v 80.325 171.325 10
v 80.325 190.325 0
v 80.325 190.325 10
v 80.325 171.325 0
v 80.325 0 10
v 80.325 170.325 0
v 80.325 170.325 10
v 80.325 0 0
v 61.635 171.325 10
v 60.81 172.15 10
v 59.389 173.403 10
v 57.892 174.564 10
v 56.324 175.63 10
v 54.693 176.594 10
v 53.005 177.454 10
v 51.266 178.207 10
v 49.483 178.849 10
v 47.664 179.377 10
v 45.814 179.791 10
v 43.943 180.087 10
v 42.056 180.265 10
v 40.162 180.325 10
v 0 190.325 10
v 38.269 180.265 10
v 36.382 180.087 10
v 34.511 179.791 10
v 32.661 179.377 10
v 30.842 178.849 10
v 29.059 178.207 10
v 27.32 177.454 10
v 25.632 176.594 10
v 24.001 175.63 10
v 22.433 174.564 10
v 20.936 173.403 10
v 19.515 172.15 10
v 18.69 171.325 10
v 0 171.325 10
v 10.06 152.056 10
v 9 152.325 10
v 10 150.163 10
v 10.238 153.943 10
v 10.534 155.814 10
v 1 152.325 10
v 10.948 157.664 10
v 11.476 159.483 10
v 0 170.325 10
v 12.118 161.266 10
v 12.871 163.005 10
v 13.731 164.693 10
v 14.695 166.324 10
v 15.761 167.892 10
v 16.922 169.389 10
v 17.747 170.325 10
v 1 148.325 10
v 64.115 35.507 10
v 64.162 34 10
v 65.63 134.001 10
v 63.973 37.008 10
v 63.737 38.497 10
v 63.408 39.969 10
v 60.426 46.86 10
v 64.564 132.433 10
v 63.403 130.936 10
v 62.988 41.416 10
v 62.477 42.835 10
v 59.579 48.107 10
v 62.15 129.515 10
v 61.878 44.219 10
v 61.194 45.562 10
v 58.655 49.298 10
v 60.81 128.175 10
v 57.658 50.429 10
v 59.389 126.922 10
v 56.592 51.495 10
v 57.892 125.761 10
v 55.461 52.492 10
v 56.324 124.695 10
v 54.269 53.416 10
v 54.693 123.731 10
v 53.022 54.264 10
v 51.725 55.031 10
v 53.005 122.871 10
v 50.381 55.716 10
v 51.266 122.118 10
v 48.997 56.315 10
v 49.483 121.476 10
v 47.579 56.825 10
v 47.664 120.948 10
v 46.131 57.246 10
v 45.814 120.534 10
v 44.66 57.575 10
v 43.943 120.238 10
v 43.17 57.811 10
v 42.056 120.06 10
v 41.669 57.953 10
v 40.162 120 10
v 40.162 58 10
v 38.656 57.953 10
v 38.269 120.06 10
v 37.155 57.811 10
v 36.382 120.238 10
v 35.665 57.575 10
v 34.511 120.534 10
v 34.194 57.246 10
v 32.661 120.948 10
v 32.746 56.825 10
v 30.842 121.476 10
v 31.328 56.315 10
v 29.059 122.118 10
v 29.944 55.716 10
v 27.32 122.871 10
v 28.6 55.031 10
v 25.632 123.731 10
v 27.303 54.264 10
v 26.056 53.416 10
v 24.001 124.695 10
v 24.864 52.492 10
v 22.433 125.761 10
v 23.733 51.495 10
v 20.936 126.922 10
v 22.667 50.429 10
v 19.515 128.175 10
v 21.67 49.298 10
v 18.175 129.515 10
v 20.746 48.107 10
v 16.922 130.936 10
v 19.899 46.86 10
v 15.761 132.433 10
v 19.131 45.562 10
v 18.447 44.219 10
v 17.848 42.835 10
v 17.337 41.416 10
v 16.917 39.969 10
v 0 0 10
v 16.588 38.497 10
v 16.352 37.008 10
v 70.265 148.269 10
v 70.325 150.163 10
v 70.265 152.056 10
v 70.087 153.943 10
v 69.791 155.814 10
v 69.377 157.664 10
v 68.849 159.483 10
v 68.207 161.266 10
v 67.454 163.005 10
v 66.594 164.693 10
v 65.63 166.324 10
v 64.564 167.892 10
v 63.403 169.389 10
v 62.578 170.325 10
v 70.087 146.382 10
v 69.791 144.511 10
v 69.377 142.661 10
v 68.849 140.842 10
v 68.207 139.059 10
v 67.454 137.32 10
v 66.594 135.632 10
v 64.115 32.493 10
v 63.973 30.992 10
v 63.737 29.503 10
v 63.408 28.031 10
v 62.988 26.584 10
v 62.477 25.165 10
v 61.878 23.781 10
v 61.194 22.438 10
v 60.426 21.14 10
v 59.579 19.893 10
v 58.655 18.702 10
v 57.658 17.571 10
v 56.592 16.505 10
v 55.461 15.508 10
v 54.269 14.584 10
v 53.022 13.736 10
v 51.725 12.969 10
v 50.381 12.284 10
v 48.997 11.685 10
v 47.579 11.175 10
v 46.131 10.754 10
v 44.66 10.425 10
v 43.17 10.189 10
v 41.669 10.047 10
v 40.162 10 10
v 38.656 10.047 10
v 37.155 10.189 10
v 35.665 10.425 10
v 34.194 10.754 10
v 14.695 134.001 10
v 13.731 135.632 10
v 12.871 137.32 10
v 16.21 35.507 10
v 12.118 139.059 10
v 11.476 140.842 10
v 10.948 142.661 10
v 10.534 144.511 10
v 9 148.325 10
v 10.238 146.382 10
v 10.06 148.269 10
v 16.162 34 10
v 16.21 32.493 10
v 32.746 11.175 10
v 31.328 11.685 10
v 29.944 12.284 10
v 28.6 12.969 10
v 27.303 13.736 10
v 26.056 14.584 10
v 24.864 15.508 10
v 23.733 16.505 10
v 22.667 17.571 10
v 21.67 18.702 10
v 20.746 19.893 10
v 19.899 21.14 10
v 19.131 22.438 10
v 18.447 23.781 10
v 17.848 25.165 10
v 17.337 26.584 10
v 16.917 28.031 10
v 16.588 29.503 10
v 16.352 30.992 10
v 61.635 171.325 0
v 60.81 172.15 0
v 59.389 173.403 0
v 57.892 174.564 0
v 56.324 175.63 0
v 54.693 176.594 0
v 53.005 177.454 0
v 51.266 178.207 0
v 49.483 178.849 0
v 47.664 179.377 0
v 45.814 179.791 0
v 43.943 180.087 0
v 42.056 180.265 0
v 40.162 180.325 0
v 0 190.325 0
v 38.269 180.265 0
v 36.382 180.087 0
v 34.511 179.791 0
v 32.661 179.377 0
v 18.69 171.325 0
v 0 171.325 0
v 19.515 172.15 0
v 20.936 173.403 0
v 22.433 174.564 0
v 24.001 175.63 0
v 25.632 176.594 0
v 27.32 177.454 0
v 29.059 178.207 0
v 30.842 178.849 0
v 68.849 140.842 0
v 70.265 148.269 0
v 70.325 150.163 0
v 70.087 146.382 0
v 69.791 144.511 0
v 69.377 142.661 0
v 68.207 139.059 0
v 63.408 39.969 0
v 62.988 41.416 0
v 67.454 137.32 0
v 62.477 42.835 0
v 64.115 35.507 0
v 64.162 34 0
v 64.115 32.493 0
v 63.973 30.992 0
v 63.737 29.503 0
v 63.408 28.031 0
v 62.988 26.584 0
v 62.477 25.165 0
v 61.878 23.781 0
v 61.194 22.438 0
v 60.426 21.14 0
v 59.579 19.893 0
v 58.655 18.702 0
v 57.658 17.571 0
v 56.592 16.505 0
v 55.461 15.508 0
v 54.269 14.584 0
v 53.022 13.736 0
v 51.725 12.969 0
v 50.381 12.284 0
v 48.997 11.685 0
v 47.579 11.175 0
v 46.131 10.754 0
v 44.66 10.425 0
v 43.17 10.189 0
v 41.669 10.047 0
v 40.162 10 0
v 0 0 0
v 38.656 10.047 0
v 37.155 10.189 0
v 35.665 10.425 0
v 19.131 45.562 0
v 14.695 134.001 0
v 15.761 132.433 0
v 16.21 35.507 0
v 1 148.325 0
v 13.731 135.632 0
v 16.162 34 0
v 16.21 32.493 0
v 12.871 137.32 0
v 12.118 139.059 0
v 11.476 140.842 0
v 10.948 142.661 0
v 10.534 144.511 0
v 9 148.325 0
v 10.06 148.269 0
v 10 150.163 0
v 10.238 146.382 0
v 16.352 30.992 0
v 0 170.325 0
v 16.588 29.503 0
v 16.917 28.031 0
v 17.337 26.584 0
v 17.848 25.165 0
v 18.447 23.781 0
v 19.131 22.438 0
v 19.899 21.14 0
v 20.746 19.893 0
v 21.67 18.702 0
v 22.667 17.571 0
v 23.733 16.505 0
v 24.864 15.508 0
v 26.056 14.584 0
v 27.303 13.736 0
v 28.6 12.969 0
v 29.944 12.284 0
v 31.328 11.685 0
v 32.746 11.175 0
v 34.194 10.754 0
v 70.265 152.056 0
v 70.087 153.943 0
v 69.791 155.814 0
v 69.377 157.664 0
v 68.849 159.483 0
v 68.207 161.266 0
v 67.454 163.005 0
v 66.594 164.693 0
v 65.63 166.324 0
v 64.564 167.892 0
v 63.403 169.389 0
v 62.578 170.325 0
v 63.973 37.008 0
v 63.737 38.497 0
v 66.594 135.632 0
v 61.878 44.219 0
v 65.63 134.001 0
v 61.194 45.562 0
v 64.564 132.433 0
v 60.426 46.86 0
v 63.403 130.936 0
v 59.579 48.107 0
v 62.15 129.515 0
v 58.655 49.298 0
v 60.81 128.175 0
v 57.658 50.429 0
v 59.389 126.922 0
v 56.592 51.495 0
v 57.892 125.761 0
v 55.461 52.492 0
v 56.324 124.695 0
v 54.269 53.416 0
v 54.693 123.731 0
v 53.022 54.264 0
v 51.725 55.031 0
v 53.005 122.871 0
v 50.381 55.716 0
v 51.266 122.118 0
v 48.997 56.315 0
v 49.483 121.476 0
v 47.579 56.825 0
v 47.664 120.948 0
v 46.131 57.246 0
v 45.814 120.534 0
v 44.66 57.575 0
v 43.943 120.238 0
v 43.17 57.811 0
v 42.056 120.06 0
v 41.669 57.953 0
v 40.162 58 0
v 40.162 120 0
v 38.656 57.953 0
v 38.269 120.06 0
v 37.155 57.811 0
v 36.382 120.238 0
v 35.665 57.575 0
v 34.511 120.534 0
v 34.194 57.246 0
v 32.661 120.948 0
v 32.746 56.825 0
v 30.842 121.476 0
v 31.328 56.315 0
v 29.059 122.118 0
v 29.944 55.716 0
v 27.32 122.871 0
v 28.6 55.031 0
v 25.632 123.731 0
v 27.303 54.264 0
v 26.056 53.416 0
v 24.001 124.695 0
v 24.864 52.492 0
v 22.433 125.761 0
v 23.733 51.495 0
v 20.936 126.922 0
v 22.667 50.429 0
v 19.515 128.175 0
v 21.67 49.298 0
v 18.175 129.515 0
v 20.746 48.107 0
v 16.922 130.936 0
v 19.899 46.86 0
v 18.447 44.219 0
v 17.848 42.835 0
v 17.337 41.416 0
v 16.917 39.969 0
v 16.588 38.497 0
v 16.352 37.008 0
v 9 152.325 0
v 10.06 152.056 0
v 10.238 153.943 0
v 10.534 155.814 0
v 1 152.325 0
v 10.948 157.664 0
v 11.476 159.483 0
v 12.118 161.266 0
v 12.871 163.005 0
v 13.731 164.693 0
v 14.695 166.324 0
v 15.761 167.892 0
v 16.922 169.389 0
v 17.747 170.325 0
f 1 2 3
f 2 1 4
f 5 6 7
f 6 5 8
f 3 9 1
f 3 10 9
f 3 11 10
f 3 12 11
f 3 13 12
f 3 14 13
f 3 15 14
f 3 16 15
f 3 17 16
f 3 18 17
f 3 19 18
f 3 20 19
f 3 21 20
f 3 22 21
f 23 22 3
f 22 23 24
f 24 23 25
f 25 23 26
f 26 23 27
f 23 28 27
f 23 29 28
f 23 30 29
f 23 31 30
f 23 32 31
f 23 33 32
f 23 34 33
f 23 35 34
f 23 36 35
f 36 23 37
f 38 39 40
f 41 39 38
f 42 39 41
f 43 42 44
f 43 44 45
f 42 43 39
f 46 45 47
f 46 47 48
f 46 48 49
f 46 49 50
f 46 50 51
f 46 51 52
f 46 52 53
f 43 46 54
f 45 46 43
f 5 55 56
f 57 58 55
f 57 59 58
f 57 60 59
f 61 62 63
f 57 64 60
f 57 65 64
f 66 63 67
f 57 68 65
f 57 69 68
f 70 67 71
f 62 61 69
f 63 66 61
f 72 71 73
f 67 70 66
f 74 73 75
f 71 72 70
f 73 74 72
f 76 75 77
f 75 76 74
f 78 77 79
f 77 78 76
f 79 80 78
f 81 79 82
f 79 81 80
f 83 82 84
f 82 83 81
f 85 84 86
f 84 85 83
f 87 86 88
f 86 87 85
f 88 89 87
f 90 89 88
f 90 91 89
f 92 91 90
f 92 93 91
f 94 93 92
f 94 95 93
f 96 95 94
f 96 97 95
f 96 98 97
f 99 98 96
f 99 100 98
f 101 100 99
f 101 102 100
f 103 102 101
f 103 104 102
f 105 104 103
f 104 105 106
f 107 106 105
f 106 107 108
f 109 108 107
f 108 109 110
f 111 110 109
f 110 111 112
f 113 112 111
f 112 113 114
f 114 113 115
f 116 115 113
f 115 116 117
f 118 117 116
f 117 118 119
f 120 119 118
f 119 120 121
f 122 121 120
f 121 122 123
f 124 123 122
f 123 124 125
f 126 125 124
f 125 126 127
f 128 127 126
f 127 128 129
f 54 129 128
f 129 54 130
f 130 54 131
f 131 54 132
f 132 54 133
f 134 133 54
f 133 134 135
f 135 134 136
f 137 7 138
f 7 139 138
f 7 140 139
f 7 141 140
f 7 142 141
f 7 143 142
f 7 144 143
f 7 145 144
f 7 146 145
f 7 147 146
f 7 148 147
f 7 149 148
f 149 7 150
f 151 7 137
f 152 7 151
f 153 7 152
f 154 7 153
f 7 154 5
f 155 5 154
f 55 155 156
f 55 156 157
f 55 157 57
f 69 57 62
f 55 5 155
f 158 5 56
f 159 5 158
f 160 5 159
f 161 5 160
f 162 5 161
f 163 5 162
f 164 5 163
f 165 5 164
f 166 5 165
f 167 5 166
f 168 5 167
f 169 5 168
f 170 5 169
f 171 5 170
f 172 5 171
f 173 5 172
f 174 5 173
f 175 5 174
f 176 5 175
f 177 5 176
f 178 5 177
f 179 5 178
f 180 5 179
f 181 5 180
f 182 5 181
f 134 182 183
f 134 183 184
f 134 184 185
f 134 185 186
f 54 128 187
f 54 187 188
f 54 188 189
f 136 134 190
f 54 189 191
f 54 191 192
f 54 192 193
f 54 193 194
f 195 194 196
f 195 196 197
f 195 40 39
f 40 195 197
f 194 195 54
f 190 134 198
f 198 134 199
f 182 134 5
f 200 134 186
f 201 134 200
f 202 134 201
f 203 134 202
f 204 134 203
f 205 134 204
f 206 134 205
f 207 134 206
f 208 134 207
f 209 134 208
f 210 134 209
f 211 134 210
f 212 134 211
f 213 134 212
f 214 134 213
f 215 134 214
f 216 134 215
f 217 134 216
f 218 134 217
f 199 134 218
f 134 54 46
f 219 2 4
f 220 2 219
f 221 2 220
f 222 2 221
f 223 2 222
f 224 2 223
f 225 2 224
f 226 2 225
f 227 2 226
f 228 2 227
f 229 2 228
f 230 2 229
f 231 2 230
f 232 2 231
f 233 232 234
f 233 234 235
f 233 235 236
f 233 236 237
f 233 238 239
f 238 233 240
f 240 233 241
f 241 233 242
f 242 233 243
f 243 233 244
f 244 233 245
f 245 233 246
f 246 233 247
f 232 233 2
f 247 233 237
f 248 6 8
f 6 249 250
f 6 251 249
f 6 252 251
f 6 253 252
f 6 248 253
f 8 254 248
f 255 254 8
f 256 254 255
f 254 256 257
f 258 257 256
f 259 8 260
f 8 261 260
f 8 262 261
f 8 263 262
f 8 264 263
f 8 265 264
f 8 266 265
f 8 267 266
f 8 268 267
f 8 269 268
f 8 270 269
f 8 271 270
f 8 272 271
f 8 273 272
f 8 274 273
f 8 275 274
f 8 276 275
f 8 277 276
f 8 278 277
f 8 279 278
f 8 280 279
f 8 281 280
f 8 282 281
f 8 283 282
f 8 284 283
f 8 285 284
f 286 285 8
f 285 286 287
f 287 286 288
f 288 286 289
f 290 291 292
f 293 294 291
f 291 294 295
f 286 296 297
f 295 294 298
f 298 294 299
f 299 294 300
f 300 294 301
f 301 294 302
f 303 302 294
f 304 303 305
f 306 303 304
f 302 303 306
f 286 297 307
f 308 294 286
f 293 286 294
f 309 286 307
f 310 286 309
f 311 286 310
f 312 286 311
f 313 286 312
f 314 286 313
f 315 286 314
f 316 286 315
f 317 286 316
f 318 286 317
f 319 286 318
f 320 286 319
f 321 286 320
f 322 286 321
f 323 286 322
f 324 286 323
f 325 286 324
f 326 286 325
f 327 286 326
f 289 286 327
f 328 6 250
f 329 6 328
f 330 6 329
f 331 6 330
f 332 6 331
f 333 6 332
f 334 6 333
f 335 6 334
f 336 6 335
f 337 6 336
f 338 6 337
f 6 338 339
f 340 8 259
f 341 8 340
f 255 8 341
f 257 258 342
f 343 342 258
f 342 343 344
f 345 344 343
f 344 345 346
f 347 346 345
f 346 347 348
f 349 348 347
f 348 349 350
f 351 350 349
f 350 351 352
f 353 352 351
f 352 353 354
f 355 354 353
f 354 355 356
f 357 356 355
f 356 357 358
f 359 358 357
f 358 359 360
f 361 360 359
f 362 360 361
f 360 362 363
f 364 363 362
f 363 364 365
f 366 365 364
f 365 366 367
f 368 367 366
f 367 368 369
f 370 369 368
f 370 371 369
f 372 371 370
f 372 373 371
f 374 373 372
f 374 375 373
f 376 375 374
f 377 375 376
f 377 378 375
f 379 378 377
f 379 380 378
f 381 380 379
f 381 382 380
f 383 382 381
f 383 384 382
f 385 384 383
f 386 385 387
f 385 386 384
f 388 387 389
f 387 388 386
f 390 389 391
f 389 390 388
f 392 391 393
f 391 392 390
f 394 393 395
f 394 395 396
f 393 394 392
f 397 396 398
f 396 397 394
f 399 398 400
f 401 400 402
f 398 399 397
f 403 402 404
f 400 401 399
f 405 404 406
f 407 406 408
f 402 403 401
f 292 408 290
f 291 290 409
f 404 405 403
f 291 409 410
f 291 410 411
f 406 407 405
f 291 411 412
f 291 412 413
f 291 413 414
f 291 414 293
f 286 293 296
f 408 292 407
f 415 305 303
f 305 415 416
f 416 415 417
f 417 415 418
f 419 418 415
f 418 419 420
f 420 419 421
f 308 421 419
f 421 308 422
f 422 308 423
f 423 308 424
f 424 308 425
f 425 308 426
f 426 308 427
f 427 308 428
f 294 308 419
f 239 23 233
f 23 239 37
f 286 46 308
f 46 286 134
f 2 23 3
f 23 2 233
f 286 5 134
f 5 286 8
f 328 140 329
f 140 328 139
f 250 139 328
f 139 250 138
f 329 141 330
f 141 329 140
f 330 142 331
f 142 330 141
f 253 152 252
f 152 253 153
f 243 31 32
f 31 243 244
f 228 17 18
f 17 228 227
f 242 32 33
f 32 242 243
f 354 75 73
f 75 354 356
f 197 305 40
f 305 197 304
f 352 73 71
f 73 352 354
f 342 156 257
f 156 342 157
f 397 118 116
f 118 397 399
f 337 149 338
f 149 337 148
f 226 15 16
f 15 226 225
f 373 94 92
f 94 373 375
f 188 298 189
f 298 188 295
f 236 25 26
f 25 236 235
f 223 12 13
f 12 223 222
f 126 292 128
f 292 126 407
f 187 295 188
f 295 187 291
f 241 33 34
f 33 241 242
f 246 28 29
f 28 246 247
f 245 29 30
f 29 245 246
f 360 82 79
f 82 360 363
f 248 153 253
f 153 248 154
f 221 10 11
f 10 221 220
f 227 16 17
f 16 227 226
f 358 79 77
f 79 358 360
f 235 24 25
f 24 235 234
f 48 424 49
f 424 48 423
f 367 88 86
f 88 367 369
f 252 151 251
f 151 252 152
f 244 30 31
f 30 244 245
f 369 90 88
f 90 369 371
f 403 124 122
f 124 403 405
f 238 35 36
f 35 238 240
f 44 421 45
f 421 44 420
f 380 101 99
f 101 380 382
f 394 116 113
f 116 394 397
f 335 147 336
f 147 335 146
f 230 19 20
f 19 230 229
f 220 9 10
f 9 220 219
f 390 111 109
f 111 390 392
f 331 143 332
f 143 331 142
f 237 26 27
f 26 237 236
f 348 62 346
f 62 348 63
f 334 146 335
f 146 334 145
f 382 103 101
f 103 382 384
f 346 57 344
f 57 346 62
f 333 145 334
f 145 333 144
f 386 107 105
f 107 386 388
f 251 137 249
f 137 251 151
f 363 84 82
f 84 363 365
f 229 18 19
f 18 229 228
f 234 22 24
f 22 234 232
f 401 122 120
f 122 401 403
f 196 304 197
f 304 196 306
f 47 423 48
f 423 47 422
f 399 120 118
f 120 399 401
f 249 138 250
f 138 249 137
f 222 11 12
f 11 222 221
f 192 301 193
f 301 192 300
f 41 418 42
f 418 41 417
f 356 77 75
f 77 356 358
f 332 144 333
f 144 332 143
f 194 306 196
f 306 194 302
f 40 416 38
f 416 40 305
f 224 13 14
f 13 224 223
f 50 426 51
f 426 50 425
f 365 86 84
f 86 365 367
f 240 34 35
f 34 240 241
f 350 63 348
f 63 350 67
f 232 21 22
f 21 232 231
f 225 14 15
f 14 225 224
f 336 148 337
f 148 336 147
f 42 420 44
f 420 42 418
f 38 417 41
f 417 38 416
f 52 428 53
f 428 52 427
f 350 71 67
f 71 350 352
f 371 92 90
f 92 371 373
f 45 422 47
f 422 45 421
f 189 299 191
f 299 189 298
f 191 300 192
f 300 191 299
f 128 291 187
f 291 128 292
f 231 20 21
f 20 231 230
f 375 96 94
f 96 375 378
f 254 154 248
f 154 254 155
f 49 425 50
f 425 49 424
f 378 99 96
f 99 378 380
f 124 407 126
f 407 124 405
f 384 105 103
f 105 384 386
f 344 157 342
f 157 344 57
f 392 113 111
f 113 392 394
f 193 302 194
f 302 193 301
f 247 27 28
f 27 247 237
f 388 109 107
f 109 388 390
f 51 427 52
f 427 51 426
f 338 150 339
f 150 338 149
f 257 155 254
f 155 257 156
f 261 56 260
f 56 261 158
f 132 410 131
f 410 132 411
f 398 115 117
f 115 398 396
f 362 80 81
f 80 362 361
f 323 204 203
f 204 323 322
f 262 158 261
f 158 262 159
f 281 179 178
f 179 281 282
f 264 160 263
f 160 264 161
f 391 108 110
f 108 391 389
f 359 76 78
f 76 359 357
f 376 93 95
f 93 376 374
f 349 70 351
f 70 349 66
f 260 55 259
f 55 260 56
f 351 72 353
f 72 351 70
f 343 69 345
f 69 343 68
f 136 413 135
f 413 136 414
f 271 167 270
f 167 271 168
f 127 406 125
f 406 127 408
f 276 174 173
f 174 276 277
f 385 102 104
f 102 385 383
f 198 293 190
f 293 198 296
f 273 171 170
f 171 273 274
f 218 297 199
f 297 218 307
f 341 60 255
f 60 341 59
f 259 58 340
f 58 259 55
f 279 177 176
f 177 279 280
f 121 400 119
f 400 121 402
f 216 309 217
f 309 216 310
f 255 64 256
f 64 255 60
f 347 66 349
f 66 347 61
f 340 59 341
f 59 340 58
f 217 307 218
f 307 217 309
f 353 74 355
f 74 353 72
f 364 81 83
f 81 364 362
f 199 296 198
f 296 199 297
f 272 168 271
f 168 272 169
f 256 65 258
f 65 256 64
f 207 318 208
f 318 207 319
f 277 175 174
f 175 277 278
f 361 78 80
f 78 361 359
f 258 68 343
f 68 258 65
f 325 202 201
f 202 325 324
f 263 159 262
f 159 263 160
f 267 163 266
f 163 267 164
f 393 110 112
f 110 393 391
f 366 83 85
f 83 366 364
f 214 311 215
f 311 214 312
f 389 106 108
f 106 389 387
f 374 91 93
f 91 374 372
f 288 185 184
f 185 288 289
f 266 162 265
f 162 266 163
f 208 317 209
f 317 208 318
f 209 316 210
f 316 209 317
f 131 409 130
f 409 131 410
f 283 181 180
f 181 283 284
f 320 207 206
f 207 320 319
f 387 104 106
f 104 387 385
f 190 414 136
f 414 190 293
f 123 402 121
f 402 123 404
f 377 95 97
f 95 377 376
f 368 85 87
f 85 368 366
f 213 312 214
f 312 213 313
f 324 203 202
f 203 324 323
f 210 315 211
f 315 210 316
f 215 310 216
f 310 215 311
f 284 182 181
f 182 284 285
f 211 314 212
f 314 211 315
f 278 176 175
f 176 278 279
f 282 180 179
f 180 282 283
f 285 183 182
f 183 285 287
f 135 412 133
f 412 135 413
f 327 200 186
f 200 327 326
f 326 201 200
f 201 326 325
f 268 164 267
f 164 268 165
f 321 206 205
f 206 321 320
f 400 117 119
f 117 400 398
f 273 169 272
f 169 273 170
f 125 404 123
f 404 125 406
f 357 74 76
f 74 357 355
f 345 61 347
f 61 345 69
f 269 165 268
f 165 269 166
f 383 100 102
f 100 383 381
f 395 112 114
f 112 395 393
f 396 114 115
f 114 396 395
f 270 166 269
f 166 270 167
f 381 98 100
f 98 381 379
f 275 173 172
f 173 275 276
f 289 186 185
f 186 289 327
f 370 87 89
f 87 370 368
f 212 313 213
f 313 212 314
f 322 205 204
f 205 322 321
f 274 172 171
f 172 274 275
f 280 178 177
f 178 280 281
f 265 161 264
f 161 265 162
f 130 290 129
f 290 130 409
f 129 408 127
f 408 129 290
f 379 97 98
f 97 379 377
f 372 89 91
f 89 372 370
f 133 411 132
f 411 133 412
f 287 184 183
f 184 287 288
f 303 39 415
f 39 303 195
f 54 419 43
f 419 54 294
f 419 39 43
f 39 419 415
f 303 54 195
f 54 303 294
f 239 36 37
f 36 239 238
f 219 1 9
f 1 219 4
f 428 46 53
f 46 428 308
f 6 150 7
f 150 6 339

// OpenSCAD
//
// Mounts a Taylor CLEARVU(tm) Jumbo Rain Gauge to a standard, 2 3/8"
// O.D. fence post.
//
// This work is licensed under the Creative Commons Attribution-ShareAlike 4.0
// International License. To view a copy of this license, visit
// http://creativecommons.org/licenses/by-sa/4.0/ or send a letter to
// Creative Commons, PO Box 1866, Mountain View, CA 94042, USA.
//

// Tun up precision = slower render time.
$fn = 100;

// Values specified in inches ...
mmPerInch = 25.4;
epsilon = 1;

// diam_gauge_largest_allowed is the largest diam of the gauges cross
// section, with a bit more space so it doesn't rub against the post.
diam_cup = 94;
diam_gauge = 45;
diam_gauge_bottomCap = 48;
diam_gauge_largest_allowed = 100;
diam_fence_post = 2.375 * mmPerInch;
diam_largest_hole = max(diam_gauge_largest_allowed, diam_fence_post);
mm_fence_side_wall_thickness = 10;


// outer dimensions
// mm_mount_width = 2 * mm_fence_side_wall_thickness + diam_largest_hole;
mm_mount_width = 2 * mm_fence_side_wall_thickness + diam_fence_post;
mm_mount_depth = 3 * mm_fence_side_wall_thickness + diam_fence_post + diam_gauge_largest_allowed;
mm_mount_height = 10;
// echo("diam_fence_post=", diam_fence_post);
// echo("mm_mount_width=", mm_mount_width);
// echo("mm_mount_depth=", mm_mount_depth);

//
// FASTENERS
// TODO: measure actual bolts!
//
// Parameterized values for outside and inside holes and height.
// Free / standard fit for M5 bolts is 5.5 mm. 
// See https://littlemachineshop.com/images/Gallery/PDF/TapDrillSizes.pdf
mm_bolt_length = 40;
mm_bolt_diam = 5.5;
mm_bolt_socket_diam = 8;
mm_bolt_socket_depth = 4;
mm_bolt_total_length = mm_bolt_length + mm_bolt_socket_depth;
mm_nut_thickness = 4;
mm_nut_diam = 8;

// Calculated reference centerlines from external dimensions
loc_x_width_centerline = mm_mount_width / 2;
loc_y_depth_centerline = mm_mount_depth / 2;
loc_z_thickness_centerline = mm_mount_height / 2;

// calculated locations
xyz_fence_hole = [
    loc_x_width_centerline,
    mm_mount_depth - mm_fence_side_wall_thickness - diam_fence_post/2,
    -epsilon];
xyz_gauge_hole = [
    loc_x_width_centerline,
    0 + mm_fence_side_wall_thickness + diam_gauge_bottomCap/2,
    -epsilon];
xyz_separation_plane = [
    0,
    mm_mount_depth - 2*mm_fence_side_wall_thickness,
    -epsilon];
xyz_bolt_hole_one = [
    mm_fence_side_wall_thickness / 2,
    mm_mount_depth, 
    loc_z_thickness_centerline];
xyz_bolt_hole_two = [
    mm_mount_width - mm_fence_side_wall_thickness / 2,
    mm_mount_depth, 
    loc_z_thickness_centerline];
xyz_nut_hole_one = [
    mm_fence_side_wall_thickness / 2,
    mm_mount_depth - mm_bolt_total_length + mm_nut_thickness, 
    loc_z_thickness_centerline - epsilon];
xyz_nut_hole_two = [
    mm_mount_width - mm_fence_side_wall_thickness / 2,
    mm_mount_depth - mm_bolt_total_length + mm_nut_thickness, 
    loc_z_thickness_centerline - epsilon];
    





difference()
{
    cube([mm_mount_width, mm_mount_depth, mm_mount_height], center=false);
    translate(xyz_fence_hole) {
        cylinder(h = mm_mount_height+2*epsilon, d=diam_fence_post);
    }
    translate(xyz_gauge_hole) {
        cylinder(h = mm_mount_height+2*epsilon, d=diam_gauge_bottomCap);
    }
    #translate(xyz_nut_hole_one) {
        cube([mm_nut_diam, mm_nut_thickness, mm_mount_height + 2*epsilon], center=true);
    }
    %translate(xyz_nut_hole_two) {
        cube([mm_nut_diam, mm_nut_thickness, mm_mount_height + 2*epsilon], center=true);
    }
    translate(xyz_separation_plane) {
        cube([1000, epsilon, 1000]);
    }
}


// module guideHole(holeDiam)
// {
//     translate([boltHoleDistFromCenter, 0, 0]) {
//         cylinder(h = 3*height, d = 0.125 * mmPerInch, center = true);
//     }
// }

// difference()
// {
//     cylinder(h = height, d = outerDiam, center = false);

//     union() {
//         cylinder(h = 3*height, d = innerDiam, center = true);
//          translate([0, 0, height - boltHexHeadHeightSmaller]) {
//             cylinder(h = 2* boltHexHeadHeightSmaller, d = boltHexHeadCornersDistSmaller, center = false, $fn = 6);
//          }
//          guideHole(0.125 * mmPerInch);
//          rotate(90) guideHole(0.125 * mmPerInch);
//          rotate(180) guideHole(0.125 * mmPerInch);
//          rotate(270) guideHole(0.125 * mmPerInch);
//     }
// }
